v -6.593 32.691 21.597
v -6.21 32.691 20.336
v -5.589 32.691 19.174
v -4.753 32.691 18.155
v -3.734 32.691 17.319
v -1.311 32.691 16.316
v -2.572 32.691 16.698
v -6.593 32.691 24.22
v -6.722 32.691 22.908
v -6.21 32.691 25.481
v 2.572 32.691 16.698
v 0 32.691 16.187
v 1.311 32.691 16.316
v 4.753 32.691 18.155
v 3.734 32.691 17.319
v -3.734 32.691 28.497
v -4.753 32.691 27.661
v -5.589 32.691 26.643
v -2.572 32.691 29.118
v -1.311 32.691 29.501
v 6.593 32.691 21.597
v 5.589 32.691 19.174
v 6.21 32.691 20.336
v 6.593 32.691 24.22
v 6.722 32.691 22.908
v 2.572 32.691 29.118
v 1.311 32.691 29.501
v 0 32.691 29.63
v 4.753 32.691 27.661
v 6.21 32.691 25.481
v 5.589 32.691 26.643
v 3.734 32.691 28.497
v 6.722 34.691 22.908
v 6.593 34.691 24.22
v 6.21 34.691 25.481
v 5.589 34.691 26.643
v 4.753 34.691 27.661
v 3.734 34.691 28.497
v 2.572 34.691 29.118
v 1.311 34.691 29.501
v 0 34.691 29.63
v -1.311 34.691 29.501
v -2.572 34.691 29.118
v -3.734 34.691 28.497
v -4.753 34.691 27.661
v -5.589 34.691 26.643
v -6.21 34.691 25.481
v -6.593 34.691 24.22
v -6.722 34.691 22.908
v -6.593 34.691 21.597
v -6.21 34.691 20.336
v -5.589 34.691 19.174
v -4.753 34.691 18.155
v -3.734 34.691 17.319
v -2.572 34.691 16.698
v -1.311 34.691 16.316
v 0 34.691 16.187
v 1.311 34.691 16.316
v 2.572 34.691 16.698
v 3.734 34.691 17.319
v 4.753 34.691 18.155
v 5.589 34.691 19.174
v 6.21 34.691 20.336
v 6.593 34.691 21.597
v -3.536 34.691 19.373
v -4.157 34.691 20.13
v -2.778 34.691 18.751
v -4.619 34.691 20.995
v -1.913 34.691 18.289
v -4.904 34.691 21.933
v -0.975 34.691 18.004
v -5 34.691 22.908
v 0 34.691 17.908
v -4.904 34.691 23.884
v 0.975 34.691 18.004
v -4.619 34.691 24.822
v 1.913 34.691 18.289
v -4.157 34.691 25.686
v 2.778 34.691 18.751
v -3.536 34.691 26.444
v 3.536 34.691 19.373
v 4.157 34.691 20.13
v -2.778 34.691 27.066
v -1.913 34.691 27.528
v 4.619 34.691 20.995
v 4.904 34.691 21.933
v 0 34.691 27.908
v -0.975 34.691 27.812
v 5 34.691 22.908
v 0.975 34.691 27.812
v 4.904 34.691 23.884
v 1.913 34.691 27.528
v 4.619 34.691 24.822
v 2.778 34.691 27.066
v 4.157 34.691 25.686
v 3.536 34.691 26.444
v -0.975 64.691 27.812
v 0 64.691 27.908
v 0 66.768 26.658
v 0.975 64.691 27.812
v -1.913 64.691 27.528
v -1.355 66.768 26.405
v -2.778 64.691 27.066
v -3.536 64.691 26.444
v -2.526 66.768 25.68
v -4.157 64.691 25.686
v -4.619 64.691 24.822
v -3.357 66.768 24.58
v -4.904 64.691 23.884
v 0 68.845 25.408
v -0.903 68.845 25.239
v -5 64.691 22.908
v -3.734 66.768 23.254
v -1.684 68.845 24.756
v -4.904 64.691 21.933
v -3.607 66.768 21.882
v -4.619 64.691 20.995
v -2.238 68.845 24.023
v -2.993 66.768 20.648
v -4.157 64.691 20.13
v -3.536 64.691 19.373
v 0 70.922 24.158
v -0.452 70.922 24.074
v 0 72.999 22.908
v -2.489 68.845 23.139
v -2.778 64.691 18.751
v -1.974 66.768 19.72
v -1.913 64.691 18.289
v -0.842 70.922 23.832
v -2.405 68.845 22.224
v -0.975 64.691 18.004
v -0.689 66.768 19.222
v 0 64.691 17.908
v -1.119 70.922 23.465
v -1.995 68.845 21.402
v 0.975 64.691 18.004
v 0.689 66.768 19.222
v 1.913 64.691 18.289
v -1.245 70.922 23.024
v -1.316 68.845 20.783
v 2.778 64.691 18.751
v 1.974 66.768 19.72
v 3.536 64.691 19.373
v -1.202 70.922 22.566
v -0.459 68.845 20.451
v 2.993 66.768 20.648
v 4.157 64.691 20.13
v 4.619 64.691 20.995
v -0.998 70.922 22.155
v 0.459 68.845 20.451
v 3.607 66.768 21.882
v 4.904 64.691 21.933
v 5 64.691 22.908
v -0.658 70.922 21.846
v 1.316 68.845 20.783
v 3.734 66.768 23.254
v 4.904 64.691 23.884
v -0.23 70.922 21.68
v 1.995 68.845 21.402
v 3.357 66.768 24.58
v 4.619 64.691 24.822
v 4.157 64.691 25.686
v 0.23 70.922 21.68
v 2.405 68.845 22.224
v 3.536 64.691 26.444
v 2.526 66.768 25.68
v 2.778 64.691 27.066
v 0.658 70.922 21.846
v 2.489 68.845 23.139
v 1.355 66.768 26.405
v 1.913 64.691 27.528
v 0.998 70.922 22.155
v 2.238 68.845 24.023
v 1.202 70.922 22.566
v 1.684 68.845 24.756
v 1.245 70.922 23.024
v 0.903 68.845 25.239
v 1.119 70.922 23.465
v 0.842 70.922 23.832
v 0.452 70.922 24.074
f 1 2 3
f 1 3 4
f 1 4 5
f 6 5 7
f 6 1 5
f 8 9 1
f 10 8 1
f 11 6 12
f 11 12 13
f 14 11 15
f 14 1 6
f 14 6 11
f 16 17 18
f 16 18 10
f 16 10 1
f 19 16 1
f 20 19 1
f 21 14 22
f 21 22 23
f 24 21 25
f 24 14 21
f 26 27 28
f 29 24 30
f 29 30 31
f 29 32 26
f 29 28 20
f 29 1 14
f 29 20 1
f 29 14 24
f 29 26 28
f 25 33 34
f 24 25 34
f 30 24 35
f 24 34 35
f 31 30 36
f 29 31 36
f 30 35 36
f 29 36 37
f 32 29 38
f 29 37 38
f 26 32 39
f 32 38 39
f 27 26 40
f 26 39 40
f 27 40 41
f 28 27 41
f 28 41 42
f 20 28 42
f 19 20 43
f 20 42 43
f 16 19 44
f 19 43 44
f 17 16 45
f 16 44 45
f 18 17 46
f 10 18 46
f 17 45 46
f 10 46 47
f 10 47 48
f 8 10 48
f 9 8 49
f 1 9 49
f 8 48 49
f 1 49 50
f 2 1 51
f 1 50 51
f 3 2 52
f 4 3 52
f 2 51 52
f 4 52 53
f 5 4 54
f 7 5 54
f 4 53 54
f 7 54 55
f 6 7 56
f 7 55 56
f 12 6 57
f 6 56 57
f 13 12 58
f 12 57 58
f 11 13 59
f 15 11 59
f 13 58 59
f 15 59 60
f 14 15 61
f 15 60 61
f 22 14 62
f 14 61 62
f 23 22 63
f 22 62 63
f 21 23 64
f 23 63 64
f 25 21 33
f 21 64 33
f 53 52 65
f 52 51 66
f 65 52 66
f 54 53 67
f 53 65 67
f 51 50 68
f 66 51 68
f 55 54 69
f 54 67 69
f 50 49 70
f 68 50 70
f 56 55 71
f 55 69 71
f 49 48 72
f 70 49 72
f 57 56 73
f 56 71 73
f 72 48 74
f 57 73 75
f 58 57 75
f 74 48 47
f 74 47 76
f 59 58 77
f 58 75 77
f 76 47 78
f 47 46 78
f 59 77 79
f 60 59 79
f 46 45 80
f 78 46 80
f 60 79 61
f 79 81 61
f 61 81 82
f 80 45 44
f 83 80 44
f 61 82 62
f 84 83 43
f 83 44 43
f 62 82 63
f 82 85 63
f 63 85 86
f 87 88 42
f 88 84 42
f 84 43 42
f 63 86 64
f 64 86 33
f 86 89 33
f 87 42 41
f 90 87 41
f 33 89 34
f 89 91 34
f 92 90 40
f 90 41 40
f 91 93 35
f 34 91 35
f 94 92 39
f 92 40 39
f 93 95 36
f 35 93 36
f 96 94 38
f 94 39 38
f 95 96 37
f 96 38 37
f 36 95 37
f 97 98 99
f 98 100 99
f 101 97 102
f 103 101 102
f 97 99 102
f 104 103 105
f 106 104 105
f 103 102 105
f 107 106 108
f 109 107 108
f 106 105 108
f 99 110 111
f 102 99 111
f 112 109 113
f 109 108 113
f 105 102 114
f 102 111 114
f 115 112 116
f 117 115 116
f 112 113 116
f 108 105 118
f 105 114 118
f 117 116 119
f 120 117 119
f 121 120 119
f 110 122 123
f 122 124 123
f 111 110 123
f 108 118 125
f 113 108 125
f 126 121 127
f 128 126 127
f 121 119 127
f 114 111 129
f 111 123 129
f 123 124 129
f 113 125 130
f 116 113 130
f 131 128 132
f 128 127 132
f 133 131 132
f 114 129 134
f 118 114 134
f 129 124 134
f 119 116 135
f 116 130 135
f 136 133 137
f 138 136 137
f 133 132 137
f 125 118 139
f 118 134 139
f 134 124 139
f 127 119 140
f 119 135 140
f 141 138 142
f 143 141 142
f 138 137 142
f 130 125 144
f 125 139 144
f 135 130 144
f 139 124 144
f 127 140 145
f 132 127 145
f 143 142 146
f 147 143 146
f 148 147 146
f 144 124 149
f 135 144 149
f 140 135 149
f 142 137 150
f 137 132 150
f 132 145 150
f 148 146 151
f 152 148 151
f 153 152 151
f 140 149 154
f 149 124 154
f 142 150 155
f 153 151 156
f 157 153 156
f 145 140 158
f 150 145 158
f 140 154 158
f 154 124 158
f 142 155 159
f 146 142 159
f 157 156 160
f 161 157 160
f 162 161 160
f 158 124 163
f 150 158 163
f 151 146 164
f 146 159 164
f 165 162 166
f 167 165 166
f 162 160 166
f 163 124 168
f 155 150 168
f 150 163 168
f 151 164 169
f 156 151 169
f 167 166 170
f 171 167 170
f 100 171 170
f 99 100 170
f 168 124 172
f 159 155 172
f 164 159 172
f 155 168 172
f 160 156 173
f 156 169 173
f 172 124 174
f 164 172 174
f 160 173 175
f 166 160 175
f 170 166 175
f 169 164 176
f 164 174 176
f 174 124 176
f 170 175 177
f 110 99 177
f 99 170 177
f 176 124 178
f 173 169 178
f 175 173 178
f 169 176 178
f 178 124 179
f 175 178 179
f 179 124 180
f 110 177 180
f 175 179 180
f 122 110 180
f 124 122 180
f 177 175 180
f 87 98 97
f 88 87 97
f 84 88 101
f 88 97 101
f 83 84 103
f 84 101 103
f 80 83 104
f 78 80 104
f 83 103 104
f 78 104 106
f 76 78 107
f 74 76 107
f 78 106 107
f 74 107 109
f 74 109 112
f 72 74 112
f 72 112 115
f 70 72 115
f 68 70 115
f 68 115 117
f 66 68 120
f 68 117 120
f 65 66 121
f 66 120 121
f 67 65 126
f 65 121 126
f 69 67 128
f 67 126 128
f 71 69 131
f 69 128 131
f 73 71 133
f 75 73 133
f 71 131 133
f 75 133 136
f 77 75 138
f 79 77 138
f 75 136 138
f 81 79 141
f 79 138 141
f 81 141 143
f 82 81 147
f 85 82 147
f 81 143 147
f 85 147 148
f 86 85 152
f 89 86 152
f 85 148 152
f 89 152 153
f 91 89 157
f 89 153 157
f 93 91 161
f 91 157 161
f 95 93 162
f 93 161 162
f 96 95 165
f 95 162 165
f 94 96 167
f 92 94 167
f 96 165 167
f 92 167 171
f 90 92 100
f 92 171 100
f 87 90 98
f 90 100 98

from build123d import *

# Parameters (mm, degrees)
SKETCH1_W           = 5
SKETCH1_H           = 30
SKETCH3_R           = 6.721759799
BOSS_EXTRUDE1_DEPTH = 2


with BuildPart() as part:
    # Sketch1 → Revolve1 (revolve)
    with BuildSketch(Plane(origin=(0, 0, 0), x_dir=(0, 0, -1), z_dir=(1, 0, 0))):
        with Locations((-25.408302522, 49.690625)):
            Rectangle(SKETCH1_W, SKETCH1_H)
    revolve(axis=Axis((0, 64.690625, 22.908302522), (0, -1, 0)))

    # Sketch2 → Revolve5 (revolve)
    with BuildSketch(Plane(origin=(0, 0, 0), x_dir=(0, 0, -1), z_dir=(1, 0, 0))):
        Polygon((-27.908302522, 64.690625), (-22.908302522, 72.998720515), (-22.908302522, 64.690625), align=None)
    revolve(axis=Axis((0, 72.998720515, 22.908302522), (0, -1, 0)))

    # Sketch3 → Boss-Extrude1 (add)
    with BuildSketch(Plane.XZ.offset(-34.690625)):
        with Locations((0, 22.908302522)):
            Circle(SKETCH3_R)
    extrude(amount=BOSS_EXTRUDE1_DEPTH)


solid = part.part
